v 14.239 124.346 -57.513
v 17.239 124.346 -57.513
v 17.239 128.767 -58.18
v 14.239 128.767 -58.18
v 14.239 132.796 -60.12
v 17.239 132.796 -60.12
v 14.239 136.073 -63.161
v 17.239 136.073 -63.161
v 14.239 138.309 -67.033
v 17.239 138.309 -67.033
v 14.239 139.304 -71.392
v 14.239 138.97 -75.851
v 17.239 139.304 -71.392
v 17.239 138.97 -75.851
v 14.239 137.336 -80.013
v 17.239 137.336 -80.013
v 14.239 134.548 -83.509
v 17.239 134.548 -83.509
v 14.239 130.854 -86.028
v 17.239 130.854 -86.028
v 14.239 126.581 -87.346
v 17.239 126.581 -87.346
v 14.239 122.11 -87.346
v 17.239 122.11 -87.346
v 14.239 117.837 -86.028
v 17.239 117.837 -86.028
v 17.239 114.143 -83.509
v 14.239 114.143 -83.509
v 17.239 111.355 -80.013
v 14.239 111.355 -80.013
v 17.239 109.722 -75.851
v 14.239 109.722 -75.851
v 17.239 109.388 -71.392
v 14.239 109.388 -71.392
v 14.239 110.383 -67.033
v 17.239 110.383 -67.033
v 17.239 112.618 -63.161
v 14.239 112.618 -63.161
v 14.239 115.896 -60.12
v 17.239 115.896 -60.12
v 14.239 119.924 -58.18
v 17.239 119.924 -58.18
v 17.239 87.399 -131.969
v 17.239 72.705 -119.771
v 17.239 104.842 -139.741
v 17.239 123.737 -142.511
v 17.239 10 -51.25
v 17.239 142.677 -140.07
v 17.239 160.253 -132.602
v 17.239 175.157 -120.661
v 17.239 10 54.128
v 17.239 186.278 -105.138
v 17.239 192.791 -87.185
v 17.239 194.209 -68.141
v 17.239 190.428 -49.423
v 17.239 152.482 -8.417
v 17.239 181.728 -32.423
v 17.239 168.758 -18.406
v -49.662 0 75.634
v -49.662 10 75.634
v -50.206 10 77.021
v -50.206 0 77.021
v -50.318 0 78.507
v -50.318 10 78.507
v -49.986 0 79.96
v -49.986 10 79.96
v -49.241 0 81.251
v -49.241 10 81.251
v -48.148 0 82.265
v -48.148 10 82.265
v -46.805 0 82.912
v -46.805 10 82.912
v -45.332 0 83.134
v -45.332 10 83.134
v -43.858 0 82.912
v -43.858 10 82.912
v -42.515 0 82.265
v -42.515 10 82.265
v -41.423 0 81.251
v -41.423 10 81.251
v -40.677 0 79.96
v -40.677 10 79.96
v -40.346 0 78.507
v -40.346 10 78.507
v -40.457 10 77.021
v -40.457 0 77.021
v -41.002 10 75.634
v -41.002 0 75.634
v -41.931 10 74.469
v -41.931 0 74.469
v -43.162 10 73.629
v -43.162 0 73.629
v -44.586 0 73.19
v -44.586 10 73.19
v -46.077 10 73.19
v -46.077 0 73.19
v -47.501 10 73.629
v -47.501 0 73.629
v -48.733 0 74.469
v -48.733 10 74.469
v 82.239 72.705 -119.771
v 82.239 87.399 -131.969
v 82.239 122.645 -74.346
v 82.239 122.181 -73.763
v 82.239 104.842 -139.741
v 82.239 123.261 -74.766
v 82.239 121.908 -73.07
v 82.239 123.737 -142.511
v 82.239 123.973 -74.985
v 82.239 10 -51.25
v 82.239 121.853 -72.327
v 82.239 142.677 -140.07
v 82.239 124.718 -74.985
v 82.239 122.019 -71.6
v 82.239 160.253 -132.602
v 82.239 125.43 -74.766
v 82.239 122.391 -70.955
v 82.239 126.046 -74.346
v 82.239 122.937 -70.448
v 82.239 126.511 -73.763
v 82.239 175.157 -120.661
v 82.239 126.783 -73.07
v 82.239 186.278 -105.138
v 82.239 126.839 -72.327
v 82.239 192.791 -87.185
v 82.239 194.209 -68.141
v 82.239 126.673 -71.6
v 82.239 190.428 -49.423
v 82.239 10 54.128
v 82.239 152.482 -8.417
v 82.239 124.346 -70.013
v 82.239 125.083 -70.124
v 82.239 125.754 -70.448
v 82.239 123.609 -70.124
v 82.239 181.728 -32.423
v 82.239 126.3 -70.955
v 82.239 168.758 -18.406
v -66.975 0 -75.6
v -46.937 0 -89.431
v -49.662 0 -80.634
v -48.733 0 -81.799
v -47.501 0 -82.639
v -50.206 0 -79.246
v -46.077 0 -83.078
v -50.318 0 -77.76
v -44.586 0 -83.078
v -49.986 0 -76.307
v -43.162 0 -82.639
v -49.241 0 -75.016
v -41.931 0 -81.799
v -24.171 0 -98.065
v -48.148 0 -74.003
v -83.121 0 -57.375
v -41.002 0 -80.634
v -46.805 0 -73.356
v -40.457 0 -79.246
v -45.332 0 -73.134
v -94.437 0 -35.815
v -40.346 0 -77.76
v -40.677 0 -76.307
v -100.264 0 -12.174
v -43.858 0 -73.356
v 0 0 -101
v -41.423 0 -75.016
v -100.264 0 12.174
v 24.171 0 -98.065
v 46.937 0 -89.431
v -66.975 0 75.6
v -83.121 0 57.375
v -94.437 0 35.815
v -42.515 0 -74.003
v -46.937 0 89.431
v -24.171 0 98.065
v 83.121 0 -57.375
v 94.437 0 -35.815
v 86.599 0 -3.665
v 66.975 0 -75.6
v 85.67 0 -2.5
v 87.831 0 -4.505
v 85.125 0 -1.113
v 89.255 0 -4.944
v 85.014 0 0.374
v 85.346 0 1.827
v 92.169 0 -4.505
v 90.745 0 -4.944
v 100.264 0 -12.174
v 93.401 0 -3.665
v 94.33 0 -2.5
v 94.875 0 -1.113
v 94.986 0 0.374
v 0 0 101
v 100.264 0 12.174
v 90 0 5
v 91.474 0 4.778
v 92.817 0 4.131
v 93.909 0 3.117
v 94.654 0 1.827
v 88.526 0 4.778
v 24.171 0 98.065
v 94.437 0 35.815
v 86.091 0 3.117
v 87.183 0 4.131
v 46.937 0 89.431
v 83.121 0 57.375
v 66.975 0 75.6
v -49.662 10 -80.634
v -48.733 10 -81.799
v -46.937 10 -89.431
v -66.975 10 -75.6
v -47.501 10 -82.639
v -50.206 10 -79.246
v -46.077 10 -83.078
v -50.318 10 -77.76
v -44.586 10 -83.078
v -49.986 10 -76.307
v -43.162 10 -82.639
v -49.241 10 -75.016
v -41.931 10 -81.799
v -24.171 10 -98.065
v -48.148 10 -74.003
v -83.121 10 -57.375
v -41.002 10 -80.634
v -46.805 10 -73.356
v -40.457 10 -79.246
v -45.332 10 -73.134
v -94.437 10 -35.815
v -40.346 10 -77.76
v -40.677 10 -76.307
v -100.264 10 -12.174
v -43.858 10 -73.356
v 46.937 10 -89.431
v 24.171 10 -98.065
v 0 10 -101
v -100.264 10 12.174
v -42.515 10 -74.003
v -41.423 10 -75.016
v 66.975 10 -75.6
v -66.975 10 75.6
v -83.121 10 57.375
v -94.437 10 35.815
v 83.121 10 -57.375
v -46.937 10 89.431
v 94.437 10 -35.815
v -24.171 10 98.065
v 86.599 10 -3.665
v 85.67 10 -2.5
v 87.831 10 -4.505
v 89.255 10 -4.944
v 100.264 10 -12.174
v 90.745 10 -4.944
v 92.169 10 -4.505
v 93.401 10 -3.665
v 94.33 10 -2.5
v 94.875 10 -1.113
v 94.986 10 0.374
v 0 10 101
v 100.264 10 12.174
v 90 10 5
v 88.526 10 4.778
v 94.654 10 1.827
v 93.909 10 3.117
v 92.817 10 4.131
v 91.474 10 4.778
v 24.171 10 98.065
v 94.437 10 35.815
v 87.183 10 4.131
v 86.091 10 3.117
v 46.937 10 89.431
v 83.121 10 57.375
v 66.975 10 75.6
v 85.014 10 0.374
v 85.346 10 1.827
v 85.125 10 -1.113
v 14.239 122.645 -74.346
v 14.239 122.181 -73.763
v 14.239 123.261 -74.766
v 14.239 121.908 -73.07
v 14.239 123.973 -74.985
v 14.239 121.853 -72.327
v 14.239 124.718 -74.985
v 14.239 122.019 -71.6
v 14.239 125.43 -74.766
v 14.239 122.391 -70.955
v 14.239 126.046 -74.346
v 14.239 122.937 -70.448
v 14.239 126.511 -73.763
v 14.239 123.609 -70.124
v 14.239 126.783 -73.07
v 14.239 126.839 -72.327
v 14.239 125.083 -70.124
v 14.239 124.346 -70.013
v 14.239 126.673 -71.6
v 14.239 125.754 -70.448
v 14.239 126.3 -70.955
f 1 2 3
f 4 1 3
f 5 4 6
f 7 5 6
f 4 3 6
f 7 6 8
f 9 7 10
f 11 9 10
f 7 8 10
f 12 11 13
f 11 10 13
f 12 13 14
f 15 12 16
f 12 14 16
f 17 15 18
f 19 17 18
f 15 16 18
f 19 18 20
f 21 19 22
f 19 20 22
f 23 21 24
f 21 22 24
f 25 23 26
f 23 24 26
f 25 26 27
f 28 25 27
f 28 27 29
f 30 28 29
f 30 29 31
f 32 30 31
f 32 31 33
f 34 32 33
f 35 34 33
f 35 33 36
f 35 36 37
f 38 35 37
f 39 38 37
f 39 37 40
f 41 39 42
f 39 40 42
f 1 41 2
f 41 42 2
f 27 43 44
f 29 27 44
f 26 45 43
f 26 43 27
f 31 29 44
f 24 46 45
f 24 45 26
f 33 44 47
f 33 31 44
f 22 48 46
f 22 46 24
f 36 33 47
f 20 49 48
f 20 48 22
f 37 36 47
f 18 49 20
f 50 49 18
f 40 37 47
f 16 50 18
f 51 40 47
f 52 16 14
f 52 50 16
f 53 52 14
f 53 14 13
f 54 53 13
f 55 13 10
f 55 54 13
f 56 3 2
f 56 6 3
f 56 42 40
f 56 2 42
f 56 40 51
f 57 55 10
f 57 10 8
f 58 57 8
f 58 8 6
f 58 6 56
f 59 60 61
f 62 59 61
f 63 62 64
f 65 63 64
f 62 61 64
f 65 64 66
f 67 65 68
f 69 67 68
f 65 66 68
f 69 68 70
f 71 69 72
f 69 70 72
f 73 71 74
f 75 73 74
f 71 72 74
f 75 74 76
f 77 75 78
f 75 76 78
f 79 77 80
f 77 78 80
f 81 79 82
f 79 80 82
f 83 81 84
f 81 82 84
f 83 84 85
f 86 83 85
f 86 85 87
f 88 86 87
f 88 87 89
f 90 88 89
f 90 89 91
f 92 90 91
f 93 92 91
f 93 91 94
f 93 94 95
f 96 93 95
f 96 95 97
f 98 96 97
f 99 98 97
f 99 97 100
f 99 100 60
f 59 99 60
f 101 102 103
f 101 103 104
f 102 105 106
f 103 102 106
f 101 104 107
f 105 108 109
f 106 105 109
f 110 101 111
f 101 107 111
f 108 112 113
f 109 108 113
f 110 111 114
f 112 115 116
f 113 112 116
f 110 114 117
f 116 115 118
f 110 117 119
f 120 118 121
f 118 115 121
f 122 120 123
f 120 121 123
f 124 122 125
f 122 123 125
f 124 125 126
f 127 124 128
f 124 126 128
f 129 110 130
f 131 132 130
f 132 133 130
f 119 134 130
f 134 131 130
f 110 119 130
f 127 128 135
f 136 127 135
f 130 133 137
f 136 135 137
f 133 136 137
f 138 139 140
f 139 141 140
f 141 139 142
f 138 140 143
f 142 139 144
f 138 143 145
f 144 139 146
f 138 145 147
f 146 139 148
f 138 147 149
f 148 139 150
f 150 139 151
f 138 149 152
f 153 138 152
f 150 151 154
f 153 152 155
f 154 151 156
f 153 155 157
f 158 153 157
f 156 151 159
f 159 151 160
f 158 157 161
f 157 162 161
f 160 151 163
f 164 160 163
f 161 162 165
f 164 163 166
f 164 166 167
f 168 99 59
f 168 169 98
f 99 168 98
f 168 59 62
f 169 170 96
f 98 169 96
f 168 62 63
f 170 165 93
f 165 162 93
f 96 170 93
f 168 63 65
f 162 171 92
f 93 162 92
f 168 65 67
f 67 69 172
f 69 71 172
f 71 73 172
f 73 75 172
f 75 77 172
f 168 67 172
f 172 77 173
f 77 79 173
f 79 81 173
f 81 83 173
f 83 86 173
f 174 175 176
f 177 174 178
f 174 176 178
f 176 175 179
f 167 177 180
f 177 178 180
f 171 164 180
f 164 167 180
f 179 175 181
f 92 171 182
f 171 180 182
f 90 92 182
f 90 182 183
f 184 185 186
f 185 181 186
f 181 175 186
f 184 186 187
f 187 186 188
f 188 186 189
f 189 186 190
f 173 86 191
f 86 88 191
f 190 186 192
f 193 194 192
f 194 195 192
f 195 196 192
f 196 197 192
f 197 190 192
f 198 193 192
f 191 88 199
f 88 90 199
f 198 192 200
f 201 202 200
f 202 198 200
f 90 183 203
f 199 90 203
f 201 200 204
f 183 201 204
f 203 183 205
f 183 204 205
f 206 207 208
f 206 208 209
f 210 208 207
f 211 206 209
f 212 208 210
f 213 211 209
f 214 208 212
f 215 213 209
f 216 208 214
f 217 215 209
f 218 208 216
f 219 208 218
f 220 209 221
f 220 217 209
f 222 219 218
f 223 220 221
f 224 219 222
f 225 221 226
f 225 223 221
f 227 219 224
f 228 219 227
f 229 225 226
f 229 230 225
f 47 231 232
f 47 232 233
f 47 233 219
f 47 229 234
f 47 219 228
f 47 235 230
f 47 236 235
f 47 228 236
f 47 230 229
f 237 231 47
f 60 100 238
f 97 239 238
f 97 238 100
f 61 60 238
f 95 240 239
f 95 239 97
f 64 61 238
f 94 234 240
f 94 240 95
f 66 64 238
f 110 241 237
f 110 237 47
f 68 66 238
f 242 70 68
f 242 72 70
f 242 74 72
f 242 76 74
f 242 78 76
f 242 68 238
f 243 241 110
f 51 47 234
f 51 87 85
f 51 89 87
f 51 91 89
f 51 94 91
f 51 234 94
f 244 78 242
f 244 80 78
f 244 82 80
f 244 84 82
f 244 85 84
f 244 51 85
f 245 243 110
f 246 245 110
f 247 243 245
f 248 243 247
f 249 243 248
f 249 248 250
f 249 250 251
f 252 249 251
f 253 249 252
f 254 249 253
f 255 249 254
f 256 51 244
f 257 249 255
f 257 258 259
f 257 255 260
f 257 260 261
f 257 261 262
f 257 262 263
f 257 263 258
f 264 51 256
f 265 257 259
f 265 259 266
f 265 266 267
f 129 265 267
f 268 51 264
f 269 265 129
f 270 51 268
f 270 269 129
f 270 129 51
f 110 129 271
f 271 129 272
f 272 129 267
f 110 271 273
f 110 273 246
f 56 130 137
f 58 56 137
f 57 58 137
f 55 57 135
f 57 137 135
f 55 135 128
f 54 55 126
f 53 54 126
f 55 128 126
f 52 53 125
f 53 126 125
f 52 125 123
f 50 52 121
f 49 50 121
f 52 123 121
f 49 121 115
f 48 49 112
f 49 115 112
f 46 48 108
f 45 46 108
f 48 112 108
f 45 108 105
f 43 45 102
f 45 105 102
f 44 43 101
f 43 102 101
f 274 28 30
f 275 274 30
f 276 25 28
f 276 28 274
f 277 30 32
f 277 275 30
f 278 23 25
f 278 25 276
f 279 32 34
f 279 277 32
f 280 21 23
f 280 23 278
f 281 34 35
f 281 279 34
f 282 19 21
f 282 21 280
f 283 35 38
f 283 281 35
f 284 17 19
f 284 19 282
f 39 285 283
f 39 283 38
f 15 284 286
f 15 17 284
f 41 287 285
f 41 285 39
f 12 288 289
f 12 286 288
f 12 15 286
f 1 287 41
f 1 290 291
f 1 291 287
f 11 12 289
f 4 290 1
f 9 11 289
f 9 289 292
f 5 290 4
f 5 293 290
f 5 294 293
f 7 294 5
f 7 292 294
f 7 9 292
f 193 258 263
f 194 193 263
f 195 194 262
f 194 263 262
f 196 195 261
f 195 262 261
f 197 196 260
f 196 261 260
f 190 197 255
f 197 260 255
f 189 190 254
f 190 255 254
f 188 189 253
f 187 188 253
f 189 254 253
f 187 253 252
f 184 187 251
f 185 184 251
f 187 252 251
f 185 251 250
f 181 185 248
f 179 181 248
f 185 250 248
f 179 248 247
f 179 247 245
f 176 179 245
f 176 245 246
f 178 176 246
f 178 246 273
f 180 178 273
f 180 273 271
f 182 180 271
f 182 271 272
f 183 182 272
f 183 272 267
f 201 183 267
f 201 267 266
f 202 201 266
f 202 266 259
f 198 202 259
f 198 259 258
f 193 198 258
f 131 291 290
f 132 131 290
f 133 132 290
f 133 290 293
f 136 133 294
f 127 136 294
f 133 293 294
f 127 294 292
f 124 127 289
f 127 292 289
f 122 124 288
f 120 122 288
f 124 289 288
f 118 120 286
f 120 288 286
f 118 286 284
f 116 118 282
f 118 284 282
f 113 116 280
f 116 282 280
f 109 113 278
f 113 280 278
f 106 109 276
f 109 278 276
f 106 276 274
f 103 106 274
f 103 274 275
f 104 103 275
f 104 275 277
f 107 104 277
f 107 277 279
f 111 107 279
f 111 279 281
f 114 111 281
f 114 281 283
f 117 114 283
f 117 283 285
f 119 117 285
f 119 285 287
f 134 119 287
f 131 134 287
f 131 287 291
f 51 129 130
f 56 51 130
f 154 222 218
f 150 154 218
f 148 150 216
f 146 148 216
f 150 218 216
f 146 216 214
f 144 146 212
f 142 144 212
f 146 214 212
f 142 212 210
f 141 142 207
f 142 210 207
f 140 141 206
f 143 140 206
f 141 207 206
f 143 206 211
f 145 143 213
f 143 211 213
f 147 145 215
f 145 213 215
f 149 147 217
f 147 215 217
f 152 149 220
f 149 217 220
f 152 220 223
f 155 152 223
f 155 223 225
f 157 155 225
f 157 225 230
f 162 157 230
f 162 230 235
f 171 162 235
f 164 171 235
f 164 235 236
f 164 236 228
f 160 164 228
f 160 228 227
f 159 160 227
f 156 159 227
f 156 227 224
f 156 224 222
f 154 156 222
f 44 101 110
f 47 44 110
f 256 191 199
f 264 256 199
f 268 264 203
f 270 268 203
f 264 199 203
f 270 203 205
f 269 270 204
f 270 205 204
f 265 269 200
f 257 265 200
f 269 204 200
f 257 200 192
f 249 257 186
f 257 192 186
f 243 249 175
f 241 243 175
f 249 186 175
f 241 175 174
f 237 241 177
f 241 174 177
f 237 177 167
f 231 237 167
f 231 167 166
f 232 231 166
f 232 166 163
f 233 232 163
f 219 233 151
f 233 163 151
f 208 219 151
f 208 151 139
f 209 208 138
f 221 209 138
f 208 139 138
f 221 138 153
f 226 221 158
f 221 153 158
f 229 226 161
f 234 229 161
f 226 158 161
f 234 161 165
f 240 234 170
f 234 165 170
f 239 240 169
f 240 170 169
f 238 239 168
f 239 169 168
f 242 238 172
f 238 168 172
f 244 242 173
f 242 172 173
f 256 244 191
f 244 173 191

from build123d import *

# Parameters (mm, degrees)
SKETCH_1_R               = 101
EXTRUDE_1_DEPTH          = 10
SKETCH_2_R               = 5
CUT_EXTRUDE_1_DEPTH      = 144.185194765
PATTERN_CIRCULAR_1_COUNT = 3
SKETCH_4_W               = 2.176372913
SKETCH_4_H               = 3.886380203
EXTRUDE_2_DEPTH          = 10
EXTRUDE_3_DEPTH          = 65
CUT_EXTRUDE_2_REACH      = 270.441
SKETCH_6_R               = 2.5
SKETCH_7_R               = 15
EXTRUDE_4_DEPTH          = 3
SKETCH_8_R               = 2.5
CUT_EXTRUDE_3_DEPTH      = 3
SKETCH_9_W               = 6.543349856
SKETCH_9_H               = 10.764234758
CUT_EXTRUDE_4_DEPTH      = 10


with BuildPart() as part:
    # 草图1 → 凸台-拉伸1 (new body)
    with BuildSketch(Plane(origin=(0, 0, 0), x_dir=(1, 0, 0), z_dir=(0, 1, 0))):
        with Locations(Location((0, 0, 0), (0, 0, 270))):
            Circle(SKETCH_1_R)
    extrude(amount=EXTRUDE_1_DEPTH)

    # 草图2 → 切除-拉伸1 (cut, through all)
    with BuildSketch(Plane(origin=(0, 10, 0), x_dir=(1, 0, 0), z_dir=(0, 1, 0))):
        with Locations(Location((90, 0, 0), (0, 0, 270))):
            Circle(SKETCH_2_R)
    cut_extrude_1 = extrude(amount=-CUT_EXTRUDE_1_DEPTH, mode=Mode.SUBTRACT)

    # 阵列(圆周)1: 切除-拉伸1 ×3 about axis
    pattern_circular_1_axis = Axis((-0.221108491, 0, 0), (0, 1, 0))
    for i in range(1, PATTERN_CIRCULAR_1_COUNT):
        add(cut_extrude_1.rotate(pattern_circular_1_axis, i * 360 / PATTERN_CIRCULAR_1_COUNT), mode=Mode.SUBTRACT)

    # 草图4 → 凸台-拉伸2 (add)
    with BuildSketch(Plane(origin=(0, 10, 0), x_dir=(1, 0, 0), z_dir=(0, 1, 0))):
        with Locations((98.327159319, -0.022531505)):
            Rectangle(SKETCH_4_W, SKETCH_4_H)
    extrude(amount=EXTRUDE_2_DEPTH)

    # 草图5 → 凸台-拉伸3 (add)
    with BuildSketch(Plane.ZY.offset(-82.238972862)):
        with BuildLine():
            Line((-119.770908646, 72.705399825), (-51.25005009, 10))
            Line((-51.25005009, 10), (54.128166527, 10))
            Line((54.128166527, 10), (-8.416959639, 152.482035135))
            ThreePointArc((-8.416959639, 152.482035135), (-113.280560411, 181.249471787), (-119.770908646, 72.705399825))
        make_face()
    extrude(amount=EXTRUDE_3_DEPTH)

    # 草图6 → 切除-拉伸2 (cut, up to next)
    with BuildSketch(Plane.ZY.offset(-17.238972862), mode=Mode.PRIVATE) as cut_extrude_2_sk1:
        with Locations((-72.513360124, 124.345733942)):
            Circle(SKETCH_6_R)
    cut_extrude_2_tool1 = extrude(cut_extrude_2_sk1.sketch, amount=-CUT_EXTRUDE_2_REACH, mode=Mode.PRIVATE) & part.part
    add(cut_extrude_2_tool1.solids().sort_by_distance((17.238973, 124.345734, -72.51336))[0], mode=Mode.SUBTRACT)

    # 草图7 → 凸台-拉伸4 (add)
    with BuildSketch(Plane.ZY.offset(-17.238972862)):
        with Locations((-72.513360124, 124.345733942)):
            Circle(SKETCH_7_R)
    extrude(amount=EXTRUDE_4_DEPTH)

    # 草图8 → 切除-拉伸3 (cut)
    with BuildSketch(Plane.ZY.offset(-14.238972862)):
        with Locations((-72.513360124, 124.345733942)):
            Circle(SKETCH_8_R)
    extrude(amount=-CUT_EXTRUDE_3_DEPTH, mode=Mode.SUBTRACT)

    # 草图9 → 切除-拉伸4 (cut)
    with BuildSketch(Plane(origin=(99.415345775, 0, 0), x_dir=(0, 0, -1), z_dir=(1, 0, 0))):
        with Locations((0.262028791, 15.382117379)):
            Rectangle(SKETCH_9_W, SKETCH_9_H)
    extrude(amount=-CUT_EXTRUDE_4_DEPTH, mode=Mode.SUBTRACT)


solid = part.part
